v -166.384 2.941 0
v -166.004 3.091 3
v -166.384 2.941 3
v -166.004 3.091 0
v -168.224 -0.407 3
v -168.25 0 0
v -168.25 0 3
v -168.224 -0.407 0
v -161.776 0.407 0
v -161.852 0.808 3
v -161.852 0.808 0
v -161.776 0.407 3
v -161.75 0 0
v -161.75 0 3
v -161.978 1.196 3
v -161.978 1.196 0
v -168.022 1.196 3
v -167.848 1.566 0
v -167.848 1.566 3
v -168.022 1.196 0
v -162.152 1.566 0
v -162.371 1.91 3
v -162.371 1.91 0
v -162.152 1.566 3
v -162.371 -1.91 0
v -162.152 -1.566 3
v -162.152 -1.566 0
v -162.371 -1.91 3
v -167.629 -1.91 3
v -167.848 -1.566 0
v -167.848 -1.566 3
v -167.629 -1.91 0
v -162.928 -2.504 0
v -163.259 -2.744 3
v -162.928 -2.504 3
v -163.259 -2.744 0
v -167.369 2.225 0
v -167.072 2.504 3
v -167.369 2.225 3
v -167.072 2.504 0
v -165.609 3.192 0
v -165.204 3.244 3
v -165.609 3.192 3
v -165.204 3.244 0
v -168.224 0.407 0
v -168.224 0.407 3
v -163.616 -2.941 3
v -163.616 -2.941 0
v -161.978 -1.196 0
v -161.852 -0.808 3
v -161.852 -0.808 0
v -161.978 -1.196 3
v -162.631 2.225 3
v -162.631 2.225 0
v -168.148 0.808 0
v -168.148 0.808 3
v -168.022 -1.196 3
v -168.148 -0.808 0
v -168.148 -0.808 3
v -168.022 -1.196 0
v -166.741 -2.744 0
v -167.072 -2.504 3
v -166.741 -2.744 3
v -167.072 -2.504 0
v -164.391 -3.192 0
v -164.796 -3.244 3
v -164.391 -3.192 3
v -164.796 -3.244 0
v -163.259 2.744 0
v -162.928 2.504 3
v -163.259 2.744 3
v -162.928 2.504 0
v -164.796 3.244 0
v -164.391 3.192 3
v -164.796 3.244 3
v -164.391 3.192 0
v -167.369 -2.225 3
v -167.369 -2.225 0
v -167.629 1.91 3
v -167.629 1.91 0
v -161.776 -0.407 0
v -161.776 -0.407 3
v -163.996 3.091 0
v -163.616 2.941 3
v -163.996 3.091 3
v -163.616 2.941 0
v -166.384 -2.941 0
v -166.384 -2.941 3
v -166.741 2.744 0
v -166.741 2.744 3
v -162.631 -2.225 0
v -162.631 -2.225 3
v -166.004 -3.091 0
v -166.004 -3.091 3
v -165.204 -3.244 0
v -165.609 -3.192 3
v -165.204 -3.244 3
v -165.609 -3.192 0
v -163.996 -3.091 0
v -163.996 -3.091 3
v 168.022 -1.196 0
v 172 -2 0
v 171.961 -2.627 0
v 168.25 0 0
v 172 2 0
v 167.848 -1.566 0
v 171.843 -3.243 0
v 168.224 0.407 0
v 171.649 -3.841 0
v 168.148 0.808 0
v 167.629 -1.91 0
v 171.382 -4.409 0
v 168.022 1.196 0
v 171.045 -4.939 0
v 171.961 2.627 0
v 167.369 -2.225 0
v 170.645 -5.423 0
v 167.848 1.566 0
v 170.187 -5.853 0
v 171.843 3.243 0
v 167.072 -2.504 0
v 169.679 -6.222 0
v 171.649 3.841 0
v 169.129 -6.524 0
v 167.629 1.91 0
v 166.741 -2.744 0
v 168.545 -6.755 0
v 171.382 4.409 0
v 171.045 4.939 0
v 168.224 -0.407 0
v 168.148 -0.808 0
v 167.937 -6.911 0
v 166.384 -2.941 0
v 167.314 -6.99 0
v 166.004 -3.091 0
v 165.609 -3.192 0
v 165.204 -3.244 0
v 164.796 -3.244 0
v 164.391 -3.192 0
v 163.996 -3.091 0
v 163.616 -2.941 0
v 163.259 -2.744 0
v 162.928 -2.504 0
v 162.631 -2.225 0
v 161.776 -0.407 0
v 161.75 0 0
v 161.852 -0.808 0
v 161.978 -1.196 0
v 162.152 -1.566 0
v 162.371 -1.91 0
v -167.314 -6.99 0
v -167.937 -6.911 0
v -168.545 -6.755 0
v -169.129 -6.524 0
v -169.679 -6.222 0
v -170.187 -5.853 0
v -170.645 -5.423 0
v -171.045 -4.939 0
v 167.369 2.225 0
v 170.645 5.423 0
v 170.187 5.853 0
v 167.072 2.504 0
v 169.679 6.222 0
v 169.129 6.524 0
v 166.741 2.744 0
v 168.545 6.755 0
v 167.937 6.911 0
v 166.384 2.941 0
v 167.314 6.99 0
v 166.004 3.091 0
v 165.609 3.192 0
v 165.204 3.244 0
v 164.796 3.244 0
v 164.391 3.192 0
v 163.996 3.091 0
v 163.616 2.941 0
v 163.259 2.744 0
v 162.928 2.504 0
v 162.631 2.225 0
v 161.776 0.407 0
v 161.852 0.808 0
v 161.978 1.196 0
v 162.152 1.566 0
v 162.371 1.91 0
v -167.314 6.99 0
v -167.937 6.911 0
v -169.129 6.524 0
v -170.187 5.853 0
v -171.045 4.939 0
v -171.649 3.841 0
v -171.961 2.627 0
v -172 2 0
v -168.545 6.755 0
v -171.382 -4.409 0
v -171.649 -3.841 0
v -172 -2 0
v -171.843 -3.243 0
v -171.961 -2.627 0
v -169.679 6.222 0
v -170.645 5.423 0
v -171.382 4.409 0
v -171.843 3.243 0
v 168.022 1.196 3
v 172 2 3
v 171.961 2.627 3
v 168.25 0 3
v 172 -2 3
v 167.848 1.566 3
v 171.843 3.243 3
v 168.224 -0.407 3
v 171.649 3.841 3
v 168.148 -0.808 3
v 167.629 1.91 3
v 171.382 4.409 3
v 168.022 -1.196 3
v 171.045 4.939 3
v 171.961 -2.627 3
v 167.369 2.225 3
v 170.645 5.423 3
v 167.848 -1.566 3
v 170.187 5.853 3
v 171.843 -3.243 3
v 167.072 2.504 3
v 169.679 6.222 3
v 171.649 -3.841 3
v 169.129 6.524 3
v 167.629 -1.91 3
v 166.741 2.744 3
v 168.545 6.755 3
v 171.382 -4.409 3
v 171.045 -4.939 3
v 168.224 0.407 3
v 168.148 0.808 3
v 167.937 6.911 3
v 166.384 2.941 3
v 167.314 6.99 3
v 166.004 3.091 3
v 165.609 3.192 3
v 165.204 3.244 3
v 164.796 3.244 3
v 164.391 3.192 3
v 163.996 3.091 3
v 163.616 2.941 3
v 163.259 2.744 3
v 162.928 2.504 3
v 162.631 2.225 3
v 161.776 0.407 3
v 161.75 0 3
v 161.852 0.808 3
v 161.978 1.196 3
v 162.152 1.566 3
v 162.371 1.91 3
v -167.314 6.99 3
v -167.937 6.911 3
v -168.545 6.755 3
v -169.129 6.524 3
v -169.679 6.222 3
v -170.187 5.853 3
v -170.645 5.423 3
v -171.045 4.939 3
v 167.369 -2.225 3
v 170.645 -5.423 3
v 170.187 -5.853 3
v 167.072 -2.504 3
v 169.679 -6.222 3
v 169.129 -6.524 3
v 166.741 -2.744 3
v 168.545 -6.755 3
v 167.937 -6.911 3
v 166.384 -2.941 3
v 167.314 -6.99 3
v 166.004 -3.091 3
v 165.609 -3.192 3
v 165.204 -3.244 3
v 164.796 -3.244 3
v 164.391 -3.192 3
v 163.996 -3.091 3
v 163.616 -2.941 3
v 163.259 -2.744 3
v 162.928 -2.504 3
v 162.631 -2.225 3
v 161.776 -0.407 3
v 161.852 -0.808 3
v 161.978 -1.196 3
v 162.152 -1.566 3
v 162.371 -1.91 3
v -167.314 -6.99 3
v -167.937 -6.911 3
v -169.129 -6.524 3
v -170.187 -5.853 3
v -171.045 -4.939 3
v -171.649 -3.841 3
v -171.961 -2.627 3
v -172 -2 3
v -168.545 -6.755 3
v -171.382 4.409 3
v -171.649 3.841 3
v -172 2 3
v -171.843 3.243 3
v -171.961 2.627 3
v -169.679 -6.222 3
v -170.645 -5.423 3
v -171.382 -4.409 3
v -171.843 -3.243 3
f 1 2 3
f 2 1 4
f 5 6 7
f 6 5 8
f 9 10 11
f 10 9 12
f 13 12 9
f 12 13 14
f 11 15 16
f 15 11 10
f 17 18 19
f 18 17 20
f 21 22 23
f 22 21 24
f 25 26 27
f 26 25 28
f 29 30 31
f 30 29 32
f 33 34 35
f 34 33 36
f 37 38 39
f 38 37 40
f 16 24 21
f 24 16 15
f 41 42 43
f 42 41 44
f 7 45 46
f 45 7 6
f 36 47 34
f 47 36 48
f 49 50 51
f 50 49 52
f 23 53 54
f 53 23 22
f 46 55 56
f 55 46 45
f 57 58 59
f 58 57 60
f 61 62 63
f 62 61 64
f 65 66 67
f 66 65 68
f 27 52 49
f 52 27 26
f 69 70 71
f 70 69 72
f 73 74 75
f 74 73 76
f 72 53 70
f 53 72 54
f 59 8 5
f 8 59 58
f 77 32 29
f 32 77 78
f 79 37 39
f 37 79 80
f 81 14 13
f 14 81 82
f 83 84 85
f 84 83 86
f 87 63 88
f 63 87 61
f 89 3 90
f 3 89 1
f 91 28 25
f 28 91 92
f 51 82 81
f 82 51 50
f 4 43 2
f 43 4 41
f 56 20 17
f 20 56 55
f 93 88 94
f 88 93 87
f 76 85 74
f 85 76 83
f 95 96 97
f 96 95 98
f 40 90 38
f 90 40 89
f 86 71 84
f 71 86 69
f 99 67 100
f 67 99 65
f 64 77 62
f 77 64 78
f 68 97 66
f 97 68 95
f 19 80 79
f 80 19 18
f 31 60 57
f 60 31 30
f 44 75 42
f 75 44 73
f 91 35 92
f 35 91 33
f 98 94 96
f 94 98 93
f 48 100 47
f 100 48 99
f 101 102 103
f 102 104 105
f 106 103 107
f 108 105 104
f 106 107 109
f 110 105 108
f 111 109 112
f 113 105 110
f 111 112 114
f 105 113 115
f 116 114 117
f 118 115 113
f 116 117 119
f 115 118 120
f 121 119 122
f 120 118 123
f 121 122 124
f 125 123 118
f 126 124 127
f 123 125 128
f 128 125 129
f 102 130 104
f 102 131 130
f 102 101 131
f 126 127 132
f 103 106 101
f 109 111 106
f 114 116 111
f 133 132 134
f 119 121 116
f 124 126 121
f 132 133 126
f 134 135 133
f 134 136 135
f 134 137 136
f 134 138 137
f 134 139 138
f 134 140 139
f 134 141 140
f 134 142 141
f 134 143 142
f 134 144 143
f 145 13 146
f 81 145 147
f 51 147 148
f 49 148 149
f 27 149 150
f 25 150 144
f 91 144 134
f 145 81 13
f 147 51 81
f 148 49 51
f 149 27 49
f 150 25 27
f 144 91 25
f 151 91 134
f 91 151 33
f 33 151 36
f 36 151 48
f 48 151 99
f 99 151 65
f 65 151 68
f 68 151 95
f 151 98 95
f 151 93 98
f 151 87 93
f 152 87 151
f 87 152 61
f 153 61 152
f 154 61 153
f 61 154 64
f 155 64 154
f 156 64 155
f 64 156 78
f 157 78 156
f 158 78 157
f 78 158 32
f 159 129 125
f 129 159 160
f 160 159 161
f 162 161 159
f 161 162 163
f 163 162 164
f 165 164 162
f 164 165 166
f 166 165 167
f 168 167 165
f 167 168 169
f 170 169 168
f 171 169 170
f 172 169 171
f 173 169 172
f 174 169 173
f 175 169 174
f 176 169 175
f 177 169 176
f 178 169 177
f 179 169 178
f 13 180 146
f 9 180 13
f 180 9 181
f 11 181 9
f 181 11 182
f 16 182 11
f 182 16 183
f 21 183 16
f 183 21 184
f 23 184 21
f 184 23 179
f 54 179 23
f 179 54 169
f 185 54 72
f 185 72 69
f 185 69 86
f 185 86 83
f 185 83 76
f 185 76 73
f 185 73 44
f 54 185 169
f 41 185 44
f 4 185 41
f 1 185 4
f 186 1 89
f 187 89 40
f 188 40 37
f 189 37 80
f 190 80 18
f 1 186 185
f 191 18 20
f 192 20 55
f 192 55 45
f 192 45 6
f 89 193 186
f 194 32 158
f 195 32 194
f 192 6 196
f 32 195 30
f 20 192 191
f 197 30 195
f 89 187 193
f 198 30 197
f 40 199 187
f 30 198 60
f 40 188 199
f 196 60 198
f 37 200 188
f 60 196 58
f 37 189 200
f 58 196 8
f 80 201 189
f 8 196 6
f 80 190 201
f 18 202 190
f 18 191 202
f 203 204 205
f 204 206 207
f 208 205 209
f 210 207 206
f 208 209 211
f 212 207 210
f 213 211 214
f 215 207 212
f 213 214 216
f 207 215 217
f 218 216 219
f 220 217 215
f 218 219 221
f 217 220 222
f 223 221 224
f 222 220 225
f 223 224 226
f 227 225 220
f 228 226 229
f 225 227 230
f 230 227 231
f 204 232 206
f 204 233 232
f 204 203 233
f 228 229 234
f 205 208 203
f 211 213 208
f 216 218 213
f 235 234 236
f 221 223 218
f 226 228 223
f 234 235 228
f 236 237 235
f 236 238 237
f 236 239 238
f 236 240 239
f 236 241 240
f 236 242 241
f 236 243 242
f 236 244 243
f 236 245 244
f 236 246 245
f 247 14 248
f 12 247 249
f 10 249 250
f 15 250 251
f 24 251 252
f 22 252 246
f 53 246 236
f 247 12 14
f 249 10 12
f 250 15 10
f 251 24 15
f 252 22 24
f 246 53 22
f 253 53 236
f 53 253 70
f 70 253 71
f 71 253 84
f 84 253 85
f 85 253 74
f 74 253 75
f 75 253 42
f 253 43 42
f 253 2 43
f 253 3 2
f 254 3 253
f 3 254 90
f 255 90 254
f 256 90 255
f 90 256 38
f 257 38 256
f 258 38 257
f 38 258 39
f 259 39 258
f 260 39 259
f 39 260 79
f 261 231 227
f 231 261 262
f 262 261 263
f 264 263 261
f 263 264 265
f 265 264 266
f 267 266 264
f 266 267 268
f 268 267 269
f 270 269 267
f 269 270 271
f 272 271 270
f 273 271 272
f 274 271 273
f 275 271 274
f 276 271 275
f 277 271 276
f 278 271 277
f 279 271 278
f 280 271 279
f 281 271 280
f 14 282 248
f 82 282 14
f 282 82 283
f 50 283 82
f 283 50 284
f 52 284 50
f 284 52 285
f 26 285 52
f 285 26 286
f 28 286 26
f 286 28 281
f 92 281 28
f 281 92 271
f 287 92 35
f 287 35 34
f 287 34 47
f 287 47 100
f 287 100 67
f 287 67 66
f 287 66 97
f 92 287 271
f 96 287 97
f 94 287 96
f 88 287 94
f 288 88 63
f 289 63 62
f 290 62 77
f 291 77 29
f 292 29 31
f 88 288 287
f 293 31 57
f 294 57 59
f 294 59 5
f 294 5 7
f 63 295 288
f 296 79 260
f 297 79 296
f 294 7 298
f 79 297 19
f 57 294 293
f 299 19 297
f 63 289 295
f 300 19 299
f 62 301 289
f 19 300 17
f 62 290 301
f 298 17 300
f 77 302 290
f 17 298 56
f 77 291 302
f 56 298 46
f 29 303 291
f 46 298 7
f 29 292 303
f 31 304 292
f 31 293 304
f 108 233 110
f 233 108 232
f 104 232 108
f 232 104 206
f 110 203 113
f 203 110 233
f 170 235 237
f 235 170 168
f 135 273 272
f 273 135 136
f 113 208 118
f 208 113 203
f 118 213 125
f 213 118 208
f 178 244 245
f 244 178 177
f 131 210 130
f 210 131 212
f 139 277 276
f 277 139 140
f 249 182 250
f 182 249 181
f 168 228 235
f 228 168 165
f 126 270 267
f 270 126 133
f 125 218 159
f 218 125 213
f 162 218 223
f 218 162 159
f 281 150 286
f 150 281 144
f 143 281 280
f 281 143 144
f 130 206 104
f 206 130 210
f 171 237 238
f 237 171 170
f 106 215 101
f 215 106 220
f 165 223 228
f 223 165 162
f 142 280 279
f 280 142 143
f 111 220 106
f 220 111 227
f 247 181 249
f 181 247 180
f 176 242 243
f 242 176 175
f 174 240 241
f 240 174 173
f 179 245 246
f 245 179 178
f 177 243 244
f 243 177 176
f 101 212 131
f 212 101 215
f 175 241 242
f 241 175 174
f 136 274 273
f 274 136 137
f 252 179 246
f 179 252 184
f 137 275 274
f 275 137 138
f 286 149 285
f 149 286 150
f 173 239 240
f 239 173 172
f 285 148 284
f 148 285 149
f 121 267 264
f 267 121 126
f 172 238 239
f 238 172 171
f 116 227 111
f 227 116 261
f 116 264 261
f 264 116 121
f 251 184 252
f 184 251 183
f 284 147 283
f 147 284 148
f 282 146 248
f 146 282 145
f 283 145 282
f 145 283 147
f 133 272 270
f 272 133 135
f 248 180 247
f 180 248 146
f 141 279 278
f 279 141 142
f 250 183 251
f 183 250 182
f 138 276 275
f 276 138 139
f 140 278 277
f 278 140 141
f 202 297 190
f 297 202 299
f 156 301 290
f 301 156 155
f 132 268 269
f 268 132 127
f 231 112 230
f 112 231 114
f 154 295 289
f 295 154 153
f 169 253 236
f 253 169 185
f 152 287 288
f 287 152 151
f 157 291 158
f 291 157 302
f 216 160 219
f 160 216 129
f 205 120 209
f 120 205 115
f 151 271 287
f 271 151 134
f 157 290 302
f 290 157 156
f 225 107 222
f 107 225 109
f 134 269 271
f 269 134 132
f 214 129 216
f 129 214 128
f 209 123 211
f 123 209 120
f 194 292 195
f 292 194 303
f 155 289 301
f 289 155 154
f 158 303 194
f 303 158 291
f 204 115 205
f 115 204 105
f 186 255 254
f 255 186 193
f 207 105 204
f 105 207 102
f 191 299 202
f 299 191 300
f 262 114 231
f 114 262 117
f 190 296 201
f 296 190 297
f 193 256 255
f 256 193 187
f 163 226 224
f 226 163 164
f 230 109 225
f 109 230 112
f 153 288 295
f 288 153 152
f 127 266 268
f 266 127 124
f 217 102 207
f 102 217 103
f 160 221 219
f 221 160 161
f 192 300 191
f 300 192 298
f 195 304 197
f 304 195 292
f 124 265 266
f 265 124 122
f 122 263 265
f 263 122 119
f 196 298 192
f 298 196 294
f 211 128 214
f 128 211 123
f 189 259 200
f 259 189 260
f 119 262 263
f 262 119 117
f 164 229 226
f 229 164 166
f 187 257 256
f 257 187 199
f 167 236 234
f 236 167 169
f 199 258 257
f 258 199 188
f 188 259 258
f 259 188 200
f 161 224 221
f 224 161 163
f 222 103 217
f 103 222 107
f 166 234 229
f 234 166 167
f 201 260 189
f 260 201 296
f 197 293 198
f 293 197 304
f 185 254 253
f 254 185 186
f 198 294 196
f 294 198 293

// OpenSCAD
$fn = 50;


difference() {
	union() {
		hull() {
			translate(v = [-167.0000000000, 2.0000000000, 0]) {
				cylinder(h = 3, r = 5);
			}
			translate(v = [167.0000000000, 2.0000000000, 0]) {
				cylinder(h = 3, r = 5);
			}
			translate(v = [-167.0000000000, -2.0000000000, 0]) {
				cylinder(h = 3, r = 5);
			}
			translate(v = [167.0000000000, -2.0000000000, 0]) {
				cylinder(h = 3, r = 5);
			}
		}
	}
	union() {
		translate(v = [-165.0000000000, 0.0000000000, 0]) {
			cylinder(h = 3, r = 3.2500000000);
		}
		translate(v = [165.0000000000, 0.0000000000, 0]) {
			cylinder(h = 3, r = 3.2500000000);
		}
		translate(v = [-165.0000000000, 0.0000000000, 0]) {
			cylinder(h = 3, r = 1.8000000000);
		}
		translate(v = [165.0000000000, 0.0000000000, 0]) {
			cylinder(h = 3, r = 1.8000000000);
		}
		translate(v = [-165.0000000000, 0.0000000000, 0]) {
			cylinder(h = 3, r = 1.8000000000);
		}
		translate(v = [165.0000000000, 0.0000000000, 0]) {
			cylinder(h = 3, r = 1.8000000000);
		}
		translate(v = [-165.0000000000, 0.0000000000, 0]) {
			cylinder(h = 3, r = 1.8000000000);
		}
		translate(v = [165.0000000000, 0.0000000000, 0]) {
			cylinder(h = 3, r = 1.8000000000);
		}
	}
}
